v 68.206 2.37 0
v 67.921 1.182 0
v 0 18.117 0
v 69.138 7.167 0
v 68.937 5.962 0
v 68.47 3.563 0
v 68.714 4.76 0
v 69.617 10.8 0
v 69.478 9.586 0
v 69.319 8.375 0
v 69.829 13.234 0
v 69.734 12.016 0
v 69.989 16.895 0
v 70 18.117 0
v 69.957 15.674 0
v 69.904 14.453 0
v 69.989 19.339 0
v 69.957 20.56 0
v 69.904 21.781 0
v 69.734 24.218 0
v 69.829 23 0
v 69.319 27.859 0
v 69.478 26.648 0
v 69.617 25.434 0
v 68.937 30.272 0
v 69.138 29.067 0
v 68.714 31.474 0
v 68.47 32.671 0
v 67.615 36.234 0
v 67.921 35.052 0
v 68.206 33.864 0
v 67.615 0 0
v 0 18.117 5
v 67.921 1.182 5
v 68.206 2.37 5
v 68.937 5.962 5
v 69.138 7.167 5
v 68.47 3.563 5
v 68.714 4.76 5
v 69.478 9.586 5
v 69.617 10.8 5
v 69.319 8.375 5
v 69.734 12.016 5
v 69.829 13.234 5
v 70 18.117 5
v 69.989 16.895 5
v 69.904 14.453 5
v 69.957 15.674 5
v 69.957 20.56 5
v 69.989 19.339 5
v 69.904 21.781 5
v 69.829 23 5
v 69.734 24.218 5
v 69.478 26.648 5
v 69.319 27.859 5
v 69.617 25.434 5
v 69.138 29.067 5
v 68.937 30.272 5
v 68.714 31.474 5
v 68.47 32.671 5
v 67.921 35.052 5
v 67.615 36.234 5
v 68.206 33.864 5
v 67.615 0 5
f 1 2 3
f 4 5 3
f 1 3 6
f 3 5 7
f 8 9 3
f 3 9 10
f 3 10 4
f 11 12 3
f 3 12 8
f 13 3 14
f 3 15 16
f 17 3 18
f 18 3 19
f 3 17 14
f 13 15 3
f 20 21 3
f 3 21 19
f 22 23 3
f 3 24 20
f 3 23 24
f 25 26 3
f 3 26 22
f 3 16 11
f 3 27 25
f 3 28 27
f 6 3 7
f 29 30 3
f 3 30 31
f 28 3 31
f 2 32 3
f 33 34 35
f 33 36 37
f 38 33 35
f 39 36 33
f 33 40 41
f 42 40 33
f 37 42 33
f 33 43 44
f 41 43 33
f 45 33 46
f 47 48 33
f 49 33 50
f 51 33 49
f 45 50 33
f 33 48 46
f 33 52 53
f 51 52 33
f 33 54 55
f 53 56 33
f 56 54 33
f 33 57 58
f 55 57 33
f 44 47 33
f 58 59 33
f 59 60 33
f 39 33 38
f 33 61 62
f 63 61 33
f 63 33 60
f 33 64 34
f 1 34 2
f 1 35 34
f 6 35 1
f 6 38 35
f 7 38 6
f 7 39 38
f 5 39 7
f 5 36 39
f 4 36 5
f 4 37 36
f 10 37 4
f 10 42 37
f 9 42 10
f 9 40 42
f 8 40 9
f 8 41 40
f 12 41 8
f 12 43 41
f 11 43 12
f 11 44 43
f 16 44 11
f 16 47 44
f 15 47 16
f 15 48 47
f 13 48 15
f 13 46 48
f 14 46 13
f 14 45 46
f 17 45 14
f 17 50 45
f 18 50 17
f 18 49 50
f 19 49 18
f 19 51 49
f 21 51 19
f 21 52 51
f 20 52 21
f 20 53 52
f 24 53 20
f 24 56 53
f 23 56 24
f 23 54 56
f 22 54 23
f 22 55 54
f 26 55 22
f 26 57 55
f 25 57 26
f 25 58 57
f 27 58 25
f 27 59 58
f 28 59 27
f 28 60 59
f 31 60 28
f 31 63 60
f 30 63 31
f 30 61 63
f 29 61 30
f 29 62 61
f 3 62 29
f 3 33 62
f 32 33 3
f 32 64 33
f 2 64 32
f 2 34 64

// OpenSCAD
$fn = 32;

// ----------------------------------------------------------------------
// Arc profile plate: sector, 32 points
// ----------------------------------------------------------------------

// --- parameters (mm) ---
sector_angle = 30;        // sector angle, degrees
sector_r = 70;            // outer radius
arc_step = 1;             // sampling step of the arc, degrees
plate_t = 5;              // plate thickness, Z

bbox_x = 2 * sector_r * sin(sector_angle / 2);  // chord of the sector
bbox_y = sector_r;  // depth of the sector (apex to arc)

profile = [[67.615, 0], [67.921, 1.182], [68.206, 2.37], [68.47, 3.563], [68.714, 4.76], [68.937, 5.962], [69.138, 7.167], [69.319, 8.375], [69.478, 9.586], [69.617, 10.8], [69.734, 12.016], [69.829, 13.234], [69.904, 14.453], [69.957, 15.674], [69.989, 16.895], [70, 18.117], [69.989, 19.339], [69.957, 20.56], [69.904, 21.781], [69.829, 23], [69.734, 24.218], [69.617, 25.434], [69.478, 26.648], [69.319, 27.859], [69.138, 29.067], [68.937, 30.272], [68.714, 31.474], [68.47, 32.671], [68.206, 33.864], [67.921, 35.052], [67.615, 36.234], [0, 18.117]];  // primary outline, 32 points, counter clockwise

// --- the one profile operation ---
linear_extrude(height = plate_t) polygon(points = profile);
